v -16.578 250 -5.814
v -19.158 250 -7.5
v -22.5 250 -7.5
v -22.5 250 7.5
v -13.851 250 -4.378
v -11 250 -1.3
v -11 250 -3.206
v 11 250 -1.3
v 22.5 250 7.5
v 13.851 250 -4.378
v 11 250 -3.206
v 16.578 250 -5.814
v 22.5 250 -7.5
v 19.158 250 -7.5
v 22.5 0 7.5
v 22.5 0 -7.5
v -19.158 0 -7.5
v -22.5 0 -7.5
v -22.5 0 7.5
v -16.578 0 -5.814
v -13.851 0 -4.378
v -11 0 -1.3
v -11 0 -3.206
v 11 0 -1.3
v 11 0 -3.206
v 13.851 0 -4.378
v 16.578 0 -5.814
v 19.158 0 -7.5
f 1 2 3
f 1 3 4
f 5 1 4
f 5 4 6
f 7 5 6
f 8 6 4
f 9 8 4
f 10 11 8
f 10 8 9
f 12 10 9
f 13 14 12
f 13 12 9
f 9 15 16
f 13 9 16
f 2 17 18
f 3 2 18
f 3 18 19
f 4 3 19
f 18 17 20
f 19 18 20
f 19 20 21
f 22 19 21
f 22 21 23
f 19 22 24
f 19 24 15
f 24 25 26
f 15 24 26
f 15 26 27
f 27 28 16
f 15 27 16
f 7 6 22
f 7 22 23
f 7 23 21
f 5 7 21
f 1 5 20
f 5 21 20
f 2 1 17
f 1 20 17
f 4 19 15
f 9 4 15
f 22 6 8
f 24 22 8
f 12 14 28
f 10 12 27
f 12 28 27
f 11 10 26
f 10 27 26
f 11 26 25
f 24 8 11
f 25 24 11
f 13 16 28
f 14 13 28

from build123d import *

# Parameters (mm, degrees)
RUNDUNG_DEPTH        = 250
SKIZZE2_W            = 22
SKIZZE2_H            = 3.270726357
AUSSPARUNGLAUF_DEPTH = 252.122480077


with BuildPart() as part:
    # Skizze1 → Rundung (new body)
    with BuildSketch(Plane(origin=(0, 0, 0), x_dir=(1, 0, 0), z_dir=(0, 1, 0))):
        with BuildLine():
            Line((-19.158288024, 7.5), (-22.5, 7.5))
            Line((-22.5, 7.5), (-22.5, -7.5))
            Line((-22.5, -7.5), (22.5, -7.5))
            Line((22.5, -7.5), (22.5, 7.5))
            Line((22.5, 7.5), (19.158288024, 7.5))
            ThreePointArc((19.158288024, 7.5), (0, 1.3), (-19.158288024, 7.5))
        make_face()
    extrude(amount=RUNDUNG_DEPTH)

    # Skizze2 → AussparungLauf (cut, through all)
    with BuildSketch(Plane(origin=(0, 250, 0), x_dir=(1, 0, 0), z_dir=(0, 1, 0))):
        with Locations((0, 2.935363178)):
            Rectangle(SKIZZE2_W, SKIZZE2_H)
    extrude(amount=-AUSSPARUNGLAUF_DEPTH, mode=Mode.SUBTRACT)


solid = part.part
